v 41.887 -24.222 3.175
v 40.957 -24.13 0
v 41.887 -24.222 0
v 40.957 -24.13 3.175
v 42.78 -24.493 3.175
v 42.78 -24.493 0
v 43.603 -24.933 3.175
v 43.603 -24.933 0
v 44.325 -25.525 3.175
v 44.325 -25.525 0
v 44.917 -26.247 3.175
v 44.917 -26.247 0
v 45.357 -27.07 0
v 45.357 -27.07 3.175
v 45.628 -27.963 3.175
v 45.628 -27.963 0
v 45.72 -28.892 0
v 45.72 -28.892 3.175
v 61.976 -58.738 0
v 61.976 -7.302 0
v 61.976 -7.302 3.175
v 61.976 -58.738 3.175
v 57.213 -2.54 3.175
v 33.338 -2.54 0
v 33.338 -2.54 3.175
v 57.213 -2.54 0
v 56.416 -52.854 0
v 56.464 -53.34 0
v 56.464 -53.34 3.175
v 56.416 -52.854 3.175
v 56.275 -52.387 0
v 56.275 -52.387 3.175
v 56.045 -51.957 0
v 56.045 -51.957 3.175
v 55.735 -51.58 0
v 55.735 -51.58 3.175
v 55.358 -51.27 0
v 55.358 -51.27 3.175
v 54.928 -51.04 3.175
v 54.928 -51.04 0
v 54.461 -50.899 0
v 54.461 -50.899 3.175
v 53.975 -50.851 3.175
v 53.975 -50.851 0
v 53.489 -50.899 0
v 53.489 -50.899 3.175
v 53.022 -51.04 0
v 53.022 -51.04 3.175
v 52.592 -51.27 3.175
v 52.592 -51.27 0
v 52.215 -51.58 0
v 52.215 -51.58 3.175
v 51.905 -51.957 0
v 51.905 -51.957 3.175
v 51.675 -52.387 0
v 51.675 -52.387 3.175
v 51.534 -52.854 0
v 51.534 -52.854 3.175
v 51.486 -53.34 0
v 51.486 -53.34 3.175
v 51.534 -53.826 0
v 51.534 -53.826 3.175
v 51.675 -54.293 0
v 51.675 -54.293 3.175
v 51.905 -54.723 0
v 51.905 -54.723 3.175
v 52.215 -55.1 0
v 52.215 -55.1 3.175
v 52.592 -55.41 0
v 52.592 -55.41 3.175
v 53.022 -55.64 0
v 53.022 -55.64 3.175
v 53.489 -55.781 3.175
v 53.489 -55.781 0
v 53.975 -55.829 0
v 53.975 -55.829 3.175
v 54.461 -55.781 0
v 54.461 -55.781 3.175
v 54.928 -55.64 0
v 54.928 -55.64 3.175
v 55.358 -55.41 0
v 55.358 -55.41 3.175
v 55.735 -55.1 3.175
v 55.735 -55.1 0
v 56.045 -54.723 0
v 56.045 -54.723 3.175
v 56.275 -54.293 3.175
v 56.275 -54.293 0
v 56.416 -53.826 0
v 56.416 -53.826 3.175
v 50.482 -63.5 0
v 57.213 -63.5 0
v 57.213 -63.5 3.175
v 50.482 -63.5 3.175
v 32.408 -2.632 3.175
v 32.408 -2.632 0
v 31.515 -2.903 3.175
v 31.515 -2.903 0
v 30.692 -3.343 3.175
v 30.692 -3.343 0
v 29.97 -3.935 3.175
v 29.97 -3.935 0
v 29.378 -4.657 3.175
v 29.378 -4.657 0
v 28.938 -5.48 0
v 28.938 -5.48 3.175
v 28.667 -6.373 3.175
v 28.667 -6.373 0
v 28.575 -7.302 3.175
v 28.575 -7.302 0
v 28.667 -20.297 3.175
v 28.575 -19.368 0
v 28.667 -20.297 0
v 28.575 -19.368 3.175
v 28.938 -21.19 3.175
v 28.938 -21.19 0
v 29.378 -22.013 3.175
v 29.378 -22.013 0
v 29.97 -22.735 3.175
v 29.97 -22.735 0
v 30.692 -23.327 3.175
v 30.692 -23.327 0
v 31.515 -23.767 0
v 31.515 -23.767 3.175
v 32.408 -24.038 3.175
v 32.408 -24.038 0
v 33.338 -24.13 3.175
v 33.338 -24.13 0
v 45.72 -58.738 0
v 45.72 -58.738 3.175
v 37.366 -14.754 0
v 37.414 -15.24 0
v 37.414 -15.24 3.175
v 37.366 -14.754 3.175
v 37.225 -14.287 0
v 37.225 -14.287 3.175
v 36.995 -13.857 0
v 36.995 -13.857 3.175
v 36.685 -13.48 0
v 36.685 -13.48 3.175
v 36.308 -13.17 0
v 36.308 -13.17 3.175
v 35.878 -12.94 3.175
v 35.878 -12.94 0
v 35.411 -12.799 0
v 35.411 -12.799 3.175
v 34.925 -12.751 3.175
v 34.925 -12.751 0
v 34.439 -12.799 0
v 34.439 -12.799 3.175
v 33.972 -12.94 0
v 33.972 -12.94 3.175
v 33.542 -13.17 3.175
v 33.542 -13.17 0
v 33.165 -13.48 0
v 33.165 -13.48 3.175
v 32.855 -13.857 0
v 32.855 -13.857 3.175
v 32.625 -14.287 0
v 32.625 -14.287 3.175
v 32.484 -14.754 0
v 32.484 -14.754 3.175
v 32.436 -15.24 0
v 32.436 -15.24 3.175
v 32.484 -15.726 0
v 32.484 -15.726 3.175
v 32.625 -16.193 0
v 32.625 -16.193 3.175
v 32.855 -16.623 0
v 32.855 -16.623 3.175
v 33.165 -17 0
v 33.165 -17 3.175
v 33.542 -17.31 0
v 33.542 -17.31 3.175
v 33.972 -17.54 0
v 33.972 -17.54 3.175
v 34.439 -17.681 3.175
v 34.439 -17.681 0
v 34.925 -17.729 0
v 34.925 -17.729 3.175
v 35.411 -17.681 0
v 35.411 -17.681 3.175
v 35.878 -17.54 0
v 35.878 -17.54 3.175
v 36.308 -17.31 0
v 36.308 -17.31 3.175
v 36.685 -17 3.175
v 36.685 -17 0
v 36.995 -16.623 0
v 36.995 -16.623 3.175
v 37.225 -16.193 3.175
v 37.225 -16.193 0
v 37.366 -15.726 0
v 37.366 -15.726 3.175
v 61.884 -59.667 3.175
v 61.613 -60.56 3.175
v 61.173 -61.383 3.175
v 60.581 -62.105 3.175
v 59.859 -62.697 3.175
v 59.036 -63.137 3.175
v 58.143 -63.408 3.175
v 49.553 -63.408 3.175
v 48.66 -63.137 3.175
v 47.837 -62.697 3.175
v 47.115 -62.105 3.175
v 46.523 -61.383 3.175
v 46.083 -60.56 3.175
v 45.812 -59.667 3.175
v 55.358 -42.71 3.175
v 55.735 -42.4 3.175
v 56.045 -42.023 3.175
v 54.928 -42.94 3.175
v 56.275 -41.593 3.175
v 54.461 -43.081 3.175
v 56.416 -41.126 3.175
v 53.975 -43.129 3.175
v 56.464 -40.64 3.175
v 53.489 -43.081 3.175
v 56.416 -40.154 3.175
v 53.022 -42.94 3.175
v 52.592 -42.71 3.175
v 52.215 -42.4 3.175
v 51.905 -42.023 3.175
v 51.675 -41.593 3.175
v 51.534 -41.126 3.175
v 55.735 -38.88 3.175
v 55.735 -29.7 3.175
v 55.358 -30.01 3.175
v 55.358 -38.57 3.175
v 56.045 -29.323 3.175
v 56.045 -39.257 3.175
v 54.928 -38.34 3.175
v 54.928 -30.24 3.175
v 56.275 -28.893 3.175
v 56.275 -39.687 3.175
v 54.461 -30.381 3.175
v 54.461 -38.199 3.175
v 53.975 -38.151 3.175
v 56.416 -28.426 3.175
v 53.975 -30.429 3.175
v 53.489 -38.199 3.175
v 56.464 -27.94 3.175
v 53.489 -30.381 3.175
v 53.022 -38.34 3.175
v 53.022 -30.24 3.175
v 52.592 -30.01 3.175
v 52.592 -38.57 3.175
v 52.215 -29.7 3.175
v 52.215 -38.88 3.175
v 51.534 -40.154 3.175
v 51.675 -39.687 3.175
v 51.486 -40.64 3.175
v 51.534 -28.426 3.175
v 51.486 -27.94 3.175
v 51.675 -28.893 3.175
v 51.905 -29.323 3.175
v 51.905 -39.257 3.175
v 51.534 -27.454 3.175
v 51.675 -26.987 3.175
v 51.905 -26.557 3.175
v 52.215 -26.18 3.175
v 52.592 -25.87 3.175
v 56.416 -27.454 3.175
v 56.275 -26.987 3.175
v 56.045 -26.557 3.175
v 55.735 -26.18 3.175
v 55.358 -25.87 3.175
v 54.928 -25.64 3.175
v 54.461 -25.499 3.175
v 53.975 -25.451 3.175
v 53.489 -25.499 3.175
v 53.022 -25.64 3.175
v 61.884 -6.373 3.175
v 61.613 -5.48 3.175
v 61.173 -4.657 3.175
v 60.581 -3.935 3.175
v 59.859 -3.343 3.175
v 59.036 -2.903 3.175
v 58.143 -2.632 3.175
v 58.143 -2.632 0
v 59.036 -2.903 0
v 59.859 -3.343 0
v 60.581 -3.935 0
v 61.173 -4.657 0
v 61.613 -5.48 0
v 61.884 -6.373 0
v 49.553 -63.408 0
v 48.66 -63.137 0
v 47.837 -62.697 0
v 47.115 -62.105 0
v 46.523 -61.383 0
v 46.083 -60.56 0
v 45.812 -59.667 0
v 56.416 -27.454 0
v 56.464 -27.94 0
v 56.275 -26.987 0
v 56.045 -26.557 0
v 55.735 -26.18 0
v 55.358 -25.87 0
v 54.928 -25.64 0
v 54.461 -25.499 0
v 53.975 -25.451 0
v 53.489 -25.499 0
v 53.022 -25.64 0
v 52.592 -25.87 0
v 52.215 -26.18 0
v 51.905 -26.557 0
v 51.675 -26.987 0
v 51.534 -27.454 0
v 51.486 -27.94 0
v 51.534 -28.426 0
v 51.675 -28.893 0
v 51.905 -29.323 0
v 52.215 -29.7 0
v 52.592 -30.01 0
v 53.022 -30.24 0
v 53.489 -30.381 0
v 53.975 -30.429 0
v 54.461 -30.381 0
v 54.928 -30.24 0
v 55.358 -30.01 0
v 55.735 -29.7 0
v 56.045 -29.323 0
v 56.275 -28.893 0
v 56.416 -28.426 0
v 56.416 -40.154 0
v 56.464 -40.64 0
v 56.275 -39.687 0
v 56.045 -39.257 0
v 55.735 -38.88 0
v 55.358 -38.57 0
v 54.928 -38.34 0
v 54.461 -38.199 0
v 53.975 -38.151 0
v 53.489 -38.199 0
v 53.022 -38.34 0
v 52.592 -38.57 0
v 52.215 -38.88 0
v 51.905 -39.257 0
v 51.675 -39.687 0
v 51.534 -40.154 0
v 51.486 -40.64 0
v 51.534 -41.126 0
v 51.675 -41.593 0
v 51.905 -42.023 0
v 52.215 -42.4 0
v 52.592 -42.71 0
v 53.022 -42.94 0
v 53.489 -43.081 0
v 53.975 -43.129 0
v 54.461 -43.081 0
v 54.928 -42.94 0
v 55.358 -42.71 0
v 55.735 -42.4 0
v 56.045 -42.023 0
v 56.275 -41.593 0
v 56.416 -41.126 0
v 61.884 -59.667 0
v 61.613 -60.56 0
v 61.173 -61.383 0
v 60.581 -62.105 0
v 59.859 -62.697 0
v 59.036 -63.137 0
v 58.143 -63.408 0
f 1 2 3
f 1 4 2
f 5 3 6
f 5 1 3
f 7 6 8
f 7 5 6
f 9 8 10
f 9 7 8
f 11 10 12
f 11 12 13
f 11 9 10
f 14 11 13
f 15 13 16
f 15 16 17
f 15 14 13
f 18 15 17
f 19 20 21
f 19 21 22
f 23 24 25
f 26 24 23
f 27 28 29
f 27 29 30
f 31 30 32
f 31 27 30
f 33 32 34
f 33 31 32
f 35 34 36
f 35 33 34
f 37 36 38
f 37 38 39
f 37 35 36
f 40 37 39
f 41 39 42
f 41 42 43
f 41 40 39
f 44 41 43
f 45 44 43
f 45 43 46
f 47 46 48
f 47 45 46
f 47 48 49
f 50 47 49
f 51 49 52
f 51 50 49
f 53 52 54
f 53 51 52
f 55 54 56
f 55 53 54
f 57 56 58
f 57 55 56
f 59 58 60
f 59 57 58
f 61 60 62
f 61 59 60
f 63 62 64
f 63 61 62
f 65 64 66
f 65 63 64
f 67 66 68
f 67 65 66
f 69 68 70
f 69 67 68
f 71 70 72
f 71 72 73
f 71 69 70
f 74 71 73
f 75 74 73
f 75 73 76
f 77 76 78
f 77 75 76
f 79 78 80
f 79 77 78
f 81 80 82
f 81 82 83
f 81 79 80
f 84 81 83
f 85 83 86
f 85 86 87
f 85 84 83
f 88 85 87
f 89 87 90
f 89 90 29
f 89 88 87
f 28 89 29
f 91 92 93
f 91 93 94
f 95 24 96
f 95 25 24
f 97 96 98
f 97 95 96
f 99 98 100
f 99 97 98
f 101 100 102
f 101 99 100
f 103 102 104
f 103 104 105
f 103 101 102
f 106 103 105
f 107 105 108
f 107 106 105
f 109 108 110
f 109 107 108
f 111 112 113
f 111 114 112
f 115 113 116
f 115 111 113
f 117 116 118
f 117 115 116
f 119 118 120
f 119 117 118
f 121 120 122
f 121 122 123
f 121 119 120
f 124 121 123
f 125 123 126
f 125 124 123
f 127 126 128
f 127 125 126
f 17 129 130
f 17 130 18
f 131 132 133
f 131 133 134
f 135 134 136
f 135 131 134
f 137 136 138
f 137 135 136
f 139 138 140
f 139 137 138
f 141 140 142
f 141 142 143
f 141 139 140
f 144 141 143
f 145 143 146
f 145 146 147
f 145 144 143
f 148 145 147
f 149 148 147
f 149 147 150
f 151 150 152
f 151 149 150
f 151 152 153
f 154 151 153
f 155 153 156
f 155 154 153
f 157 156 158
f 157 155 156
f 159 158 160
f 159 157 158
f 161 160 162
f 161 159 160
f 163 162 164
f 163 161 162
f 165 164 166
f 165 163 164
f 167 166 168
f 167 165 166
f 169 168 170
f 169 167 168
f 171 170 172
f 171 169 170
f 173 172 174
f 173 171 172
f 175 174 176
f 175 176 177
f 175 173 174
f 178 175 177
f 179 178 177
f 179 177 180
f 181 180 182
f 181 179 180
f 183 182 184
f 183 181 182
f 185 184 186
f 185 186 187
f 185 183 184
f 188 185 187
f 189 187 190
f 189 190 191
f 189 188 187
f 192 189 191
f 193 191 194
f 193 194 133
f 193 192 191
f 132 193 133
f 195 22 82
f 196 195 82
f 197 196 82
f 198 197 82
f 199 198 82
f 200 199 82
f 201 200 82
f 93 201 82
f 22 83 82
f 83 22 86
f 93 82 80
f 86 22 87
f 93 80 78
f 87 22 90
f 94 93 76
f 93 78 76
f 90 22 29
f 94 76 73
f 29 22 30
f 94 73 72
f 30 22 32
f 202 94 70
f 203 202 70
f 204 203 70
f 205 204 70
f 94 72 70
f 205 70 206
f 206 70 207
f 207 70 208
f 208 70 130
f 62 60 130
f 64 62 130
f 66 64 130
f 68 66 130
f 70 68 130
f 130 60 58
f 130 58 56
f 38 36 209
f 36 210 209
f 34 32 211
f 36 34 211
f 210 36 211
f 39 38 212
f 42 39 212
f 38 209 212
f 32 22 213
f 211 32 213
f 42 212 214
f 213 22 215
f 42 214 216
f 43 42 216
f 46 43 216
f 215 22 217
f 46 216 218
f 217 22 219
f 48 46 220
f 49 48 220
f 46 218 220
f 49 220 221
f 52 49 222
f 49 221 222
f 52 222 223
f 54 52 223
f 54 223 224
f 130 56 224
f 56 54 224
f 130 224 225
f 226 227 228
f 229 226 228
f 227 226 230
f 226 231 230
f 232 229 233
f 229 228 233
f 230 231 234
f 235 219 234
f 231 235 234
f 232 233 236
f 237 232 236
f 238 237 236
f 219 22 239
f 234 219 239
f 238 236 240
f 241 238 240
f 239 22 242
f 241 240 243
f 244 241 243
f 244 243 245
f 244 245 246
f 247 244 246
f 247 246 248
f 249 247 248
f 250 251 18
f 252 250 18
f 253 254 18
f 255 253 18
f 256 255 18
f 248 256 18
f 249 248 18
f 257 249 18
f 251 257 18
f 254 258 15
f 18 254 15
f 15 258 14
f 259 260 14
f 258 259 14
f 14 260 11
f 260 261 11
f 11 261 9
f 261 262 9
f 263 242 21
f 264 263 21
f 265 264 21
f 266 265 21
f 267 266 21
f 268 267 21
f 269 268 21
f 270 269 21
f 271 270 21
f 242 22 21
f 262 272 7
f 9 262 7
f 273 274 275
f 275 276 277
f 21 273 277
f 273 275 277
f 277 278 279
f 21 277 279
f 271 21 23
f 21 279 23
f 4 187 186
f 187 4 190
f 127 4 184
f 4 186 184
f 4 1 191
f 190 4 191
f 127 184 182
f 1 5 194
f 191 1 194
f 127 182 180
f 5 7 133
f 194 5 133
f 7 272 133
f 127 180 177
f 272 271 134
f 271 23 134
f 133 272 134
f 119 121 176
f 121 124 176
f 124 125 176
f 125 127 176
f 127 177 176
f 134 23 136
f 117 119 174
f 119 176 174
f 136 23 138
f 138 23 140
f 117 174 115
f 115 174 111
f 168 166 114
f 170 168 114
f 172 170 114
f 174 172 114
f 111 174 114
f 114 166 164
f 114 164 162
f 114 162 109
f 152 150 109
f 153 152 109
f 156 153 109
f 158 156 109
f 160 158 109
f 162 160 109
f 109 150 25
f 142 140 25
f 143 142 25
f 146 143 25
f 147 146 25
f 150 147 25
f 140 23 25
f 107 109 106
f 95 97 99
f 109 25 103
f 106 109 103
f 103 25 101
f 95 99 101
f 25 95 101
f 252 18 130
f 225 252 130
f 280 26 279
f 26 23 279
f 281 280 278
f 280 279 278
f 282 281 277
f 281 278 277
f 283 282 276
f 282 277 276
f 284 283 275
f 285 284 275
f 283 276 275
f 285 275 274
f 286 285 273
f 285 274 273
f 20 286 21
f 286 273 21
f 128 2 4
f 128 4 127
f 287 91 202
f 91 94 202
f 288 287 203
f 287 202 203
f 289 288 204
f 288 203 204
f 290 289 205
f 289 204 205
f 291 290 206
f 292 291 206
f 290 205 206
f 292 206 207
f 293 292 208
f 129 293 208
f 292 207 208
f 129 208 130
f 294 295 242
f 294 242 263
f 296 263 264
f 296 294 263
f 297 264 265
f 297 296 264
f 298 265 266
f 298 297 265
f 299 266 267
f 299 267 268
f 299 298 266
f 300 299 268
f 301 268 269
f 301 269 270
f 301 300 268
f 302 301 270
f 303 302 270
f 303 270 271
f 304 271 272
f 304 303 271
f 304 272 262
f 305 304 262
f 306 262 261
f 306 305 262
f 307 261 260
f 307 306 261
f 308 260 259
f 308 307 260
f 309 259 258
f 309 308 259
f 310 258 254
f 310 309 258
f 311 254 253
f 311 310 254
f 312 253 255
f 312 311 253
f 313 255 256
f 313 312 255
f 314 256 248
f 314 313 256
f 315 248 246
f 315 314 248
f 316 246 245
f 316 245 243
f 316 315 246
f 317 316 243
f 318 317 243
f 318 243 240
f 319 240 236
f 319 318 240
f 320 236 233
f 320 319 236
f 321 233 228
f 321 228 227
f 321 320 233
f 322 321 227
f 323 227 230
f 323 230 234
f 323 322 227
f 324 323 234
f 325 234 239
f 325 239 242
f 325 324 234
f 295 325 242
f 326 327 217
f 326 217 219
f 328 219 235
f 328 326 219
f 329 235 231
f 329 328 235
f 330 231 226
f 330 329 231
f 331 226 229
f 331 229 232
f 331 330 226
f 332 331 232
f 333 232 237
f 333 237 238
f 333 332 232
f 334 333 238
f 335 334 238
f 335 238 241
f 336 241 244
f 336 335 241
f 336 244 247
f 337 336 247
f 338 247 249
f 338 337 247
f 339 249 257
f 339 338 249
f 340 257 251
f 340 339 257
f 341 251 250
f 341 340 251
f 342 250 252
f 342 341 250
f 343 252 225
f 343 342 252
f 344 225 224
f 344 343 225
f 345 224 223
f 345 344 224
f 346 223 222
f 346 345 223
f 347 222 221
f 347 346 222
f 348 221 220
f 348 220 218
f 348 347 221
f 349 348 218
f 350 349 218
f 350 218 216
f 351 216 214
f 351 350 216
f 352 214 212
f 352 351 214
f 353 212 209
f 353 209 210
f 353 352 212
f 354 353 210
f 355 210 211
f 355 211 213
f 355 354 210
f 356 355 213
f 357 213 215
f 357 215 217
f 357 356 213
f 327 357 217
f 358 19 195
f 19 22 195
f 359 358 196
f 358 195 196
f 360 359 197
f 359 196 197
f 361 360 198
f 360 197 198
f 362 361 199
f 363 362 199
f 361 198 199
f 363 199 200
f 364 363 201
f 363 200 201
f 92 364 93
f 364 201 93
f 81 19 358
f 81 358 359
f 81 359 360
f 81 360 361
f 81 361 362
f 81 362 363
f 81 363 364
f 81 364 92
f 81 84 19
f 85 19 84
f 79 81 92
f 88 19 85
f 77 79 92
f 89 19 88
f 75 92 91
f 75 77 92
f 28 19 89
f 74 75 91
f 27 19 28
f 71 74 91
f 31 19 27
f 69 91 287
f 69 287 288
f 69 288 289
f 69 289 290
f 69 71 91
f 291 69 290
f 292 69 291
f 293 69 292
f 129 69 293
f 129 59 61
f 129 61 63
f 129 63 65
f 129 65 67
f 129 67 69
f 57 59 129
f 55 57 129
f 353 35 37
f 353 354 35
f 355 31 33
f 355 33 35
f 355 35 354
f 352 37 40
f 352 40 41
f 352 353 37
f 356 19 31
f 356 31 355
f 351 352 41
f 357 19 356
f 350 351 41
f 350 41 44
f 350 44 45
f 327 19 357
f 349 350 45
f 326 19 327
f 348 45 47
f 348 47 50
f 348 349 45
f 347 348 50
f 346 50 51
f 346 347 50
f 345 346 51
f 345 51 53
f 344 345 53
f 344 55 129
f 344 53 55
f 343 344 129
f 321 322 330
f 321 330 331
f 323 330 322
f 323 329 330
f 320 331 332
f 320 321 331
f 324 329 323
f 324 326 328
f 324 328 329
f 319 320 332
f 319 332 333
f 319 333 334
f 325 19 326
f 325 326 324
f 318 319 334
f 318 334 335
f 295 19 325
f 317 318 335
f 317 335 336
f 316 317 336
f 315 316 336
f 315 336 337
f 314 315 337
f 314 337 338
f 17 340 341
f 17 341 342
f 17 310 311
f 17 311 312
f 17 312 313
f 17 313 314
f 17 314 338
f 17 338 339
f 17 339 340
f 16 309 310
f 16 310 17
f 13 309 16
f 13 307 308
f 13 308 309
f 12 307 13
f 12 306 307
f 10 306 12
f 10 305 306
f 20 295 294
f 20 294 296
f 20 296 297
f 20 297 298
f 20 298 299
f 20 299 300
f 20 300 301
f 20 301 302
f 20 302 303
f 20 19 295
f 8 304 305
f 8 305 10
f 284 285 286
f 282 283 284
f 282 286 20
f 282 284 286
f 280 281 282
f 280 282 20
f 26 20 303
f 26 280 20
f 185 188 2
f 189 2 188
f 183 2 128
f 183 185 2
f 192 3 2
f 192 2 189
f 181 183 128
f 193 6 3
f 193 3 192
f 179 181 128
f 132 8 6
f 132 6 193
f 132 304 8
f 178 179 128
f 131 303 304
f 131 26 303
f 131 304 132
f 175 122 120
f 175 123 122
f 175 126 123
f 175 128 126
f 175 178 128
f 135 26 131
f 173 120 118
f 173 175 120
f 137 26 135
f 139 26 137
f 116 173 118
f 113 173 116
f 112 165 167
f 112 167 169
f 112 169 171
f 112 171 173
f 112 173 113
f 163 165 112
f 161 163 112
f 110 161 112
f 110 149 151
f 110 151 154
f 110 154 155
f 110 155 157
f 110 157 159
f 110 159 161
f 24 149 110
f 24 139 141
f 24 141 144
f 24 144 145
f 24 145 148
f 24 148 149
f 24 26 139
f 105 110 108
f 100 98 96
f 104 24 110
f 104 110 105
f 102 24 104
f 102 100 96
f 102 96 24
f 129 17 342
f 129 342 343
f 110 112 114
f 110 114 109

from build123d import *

# Parameters (mm, degrees)
SKETCH1_R           = 2.4892
BOSS_EXTRUDE1_DEPTH = 3.175
FILLET1_R           = 4.7625


with BuildPart() as part:
    # Sketch1 → Boss-Extrude1 (new body)
    with BuildSketch(Plane.XY):
        Polygon((28.575, -2.54), (61.976, -2.54), (61.976, -63.5), (45.72, -63.5), (45.72, -24.13), (28.575, -24.13), align=None)
        with Locations((53.975, -27.94)):
            Circle(SKETCH1_R, mode=Mode.SUBTRACT)
        with Locations((53.975, -40.64)):
            Circle(SKETCH1_R, mode=Mode.SUBTRACT)
        with Locations((53.975, -53.34)):
            Circle(SKETCH1_R, mode=Mode.SUBTRACT)
        with Locations((34.925, -15.24)):
            Circle(SKETCH1_R, mode=Mode.SUBTRACT)
    extrude(amount=BOSS_EXTRUDE1_DEPTH)

    # Fillet1
    fillet1_edges = [part.edges().sort_by_distance(p)[0] for p in [
        (61.976, -63.5, 1.5875),
        (45.72, -63.5, 1.5875),
        (45.72, -24.13, 1.5875),
        (28.575, -24.13, 1.5875),
        (28.575, -2.54, 1.5875),
        (61.976, -2.54, 1.5875),
    ]]
    fillet(fillet1_edges, radius=FILLET1_R)


solid = part.part
